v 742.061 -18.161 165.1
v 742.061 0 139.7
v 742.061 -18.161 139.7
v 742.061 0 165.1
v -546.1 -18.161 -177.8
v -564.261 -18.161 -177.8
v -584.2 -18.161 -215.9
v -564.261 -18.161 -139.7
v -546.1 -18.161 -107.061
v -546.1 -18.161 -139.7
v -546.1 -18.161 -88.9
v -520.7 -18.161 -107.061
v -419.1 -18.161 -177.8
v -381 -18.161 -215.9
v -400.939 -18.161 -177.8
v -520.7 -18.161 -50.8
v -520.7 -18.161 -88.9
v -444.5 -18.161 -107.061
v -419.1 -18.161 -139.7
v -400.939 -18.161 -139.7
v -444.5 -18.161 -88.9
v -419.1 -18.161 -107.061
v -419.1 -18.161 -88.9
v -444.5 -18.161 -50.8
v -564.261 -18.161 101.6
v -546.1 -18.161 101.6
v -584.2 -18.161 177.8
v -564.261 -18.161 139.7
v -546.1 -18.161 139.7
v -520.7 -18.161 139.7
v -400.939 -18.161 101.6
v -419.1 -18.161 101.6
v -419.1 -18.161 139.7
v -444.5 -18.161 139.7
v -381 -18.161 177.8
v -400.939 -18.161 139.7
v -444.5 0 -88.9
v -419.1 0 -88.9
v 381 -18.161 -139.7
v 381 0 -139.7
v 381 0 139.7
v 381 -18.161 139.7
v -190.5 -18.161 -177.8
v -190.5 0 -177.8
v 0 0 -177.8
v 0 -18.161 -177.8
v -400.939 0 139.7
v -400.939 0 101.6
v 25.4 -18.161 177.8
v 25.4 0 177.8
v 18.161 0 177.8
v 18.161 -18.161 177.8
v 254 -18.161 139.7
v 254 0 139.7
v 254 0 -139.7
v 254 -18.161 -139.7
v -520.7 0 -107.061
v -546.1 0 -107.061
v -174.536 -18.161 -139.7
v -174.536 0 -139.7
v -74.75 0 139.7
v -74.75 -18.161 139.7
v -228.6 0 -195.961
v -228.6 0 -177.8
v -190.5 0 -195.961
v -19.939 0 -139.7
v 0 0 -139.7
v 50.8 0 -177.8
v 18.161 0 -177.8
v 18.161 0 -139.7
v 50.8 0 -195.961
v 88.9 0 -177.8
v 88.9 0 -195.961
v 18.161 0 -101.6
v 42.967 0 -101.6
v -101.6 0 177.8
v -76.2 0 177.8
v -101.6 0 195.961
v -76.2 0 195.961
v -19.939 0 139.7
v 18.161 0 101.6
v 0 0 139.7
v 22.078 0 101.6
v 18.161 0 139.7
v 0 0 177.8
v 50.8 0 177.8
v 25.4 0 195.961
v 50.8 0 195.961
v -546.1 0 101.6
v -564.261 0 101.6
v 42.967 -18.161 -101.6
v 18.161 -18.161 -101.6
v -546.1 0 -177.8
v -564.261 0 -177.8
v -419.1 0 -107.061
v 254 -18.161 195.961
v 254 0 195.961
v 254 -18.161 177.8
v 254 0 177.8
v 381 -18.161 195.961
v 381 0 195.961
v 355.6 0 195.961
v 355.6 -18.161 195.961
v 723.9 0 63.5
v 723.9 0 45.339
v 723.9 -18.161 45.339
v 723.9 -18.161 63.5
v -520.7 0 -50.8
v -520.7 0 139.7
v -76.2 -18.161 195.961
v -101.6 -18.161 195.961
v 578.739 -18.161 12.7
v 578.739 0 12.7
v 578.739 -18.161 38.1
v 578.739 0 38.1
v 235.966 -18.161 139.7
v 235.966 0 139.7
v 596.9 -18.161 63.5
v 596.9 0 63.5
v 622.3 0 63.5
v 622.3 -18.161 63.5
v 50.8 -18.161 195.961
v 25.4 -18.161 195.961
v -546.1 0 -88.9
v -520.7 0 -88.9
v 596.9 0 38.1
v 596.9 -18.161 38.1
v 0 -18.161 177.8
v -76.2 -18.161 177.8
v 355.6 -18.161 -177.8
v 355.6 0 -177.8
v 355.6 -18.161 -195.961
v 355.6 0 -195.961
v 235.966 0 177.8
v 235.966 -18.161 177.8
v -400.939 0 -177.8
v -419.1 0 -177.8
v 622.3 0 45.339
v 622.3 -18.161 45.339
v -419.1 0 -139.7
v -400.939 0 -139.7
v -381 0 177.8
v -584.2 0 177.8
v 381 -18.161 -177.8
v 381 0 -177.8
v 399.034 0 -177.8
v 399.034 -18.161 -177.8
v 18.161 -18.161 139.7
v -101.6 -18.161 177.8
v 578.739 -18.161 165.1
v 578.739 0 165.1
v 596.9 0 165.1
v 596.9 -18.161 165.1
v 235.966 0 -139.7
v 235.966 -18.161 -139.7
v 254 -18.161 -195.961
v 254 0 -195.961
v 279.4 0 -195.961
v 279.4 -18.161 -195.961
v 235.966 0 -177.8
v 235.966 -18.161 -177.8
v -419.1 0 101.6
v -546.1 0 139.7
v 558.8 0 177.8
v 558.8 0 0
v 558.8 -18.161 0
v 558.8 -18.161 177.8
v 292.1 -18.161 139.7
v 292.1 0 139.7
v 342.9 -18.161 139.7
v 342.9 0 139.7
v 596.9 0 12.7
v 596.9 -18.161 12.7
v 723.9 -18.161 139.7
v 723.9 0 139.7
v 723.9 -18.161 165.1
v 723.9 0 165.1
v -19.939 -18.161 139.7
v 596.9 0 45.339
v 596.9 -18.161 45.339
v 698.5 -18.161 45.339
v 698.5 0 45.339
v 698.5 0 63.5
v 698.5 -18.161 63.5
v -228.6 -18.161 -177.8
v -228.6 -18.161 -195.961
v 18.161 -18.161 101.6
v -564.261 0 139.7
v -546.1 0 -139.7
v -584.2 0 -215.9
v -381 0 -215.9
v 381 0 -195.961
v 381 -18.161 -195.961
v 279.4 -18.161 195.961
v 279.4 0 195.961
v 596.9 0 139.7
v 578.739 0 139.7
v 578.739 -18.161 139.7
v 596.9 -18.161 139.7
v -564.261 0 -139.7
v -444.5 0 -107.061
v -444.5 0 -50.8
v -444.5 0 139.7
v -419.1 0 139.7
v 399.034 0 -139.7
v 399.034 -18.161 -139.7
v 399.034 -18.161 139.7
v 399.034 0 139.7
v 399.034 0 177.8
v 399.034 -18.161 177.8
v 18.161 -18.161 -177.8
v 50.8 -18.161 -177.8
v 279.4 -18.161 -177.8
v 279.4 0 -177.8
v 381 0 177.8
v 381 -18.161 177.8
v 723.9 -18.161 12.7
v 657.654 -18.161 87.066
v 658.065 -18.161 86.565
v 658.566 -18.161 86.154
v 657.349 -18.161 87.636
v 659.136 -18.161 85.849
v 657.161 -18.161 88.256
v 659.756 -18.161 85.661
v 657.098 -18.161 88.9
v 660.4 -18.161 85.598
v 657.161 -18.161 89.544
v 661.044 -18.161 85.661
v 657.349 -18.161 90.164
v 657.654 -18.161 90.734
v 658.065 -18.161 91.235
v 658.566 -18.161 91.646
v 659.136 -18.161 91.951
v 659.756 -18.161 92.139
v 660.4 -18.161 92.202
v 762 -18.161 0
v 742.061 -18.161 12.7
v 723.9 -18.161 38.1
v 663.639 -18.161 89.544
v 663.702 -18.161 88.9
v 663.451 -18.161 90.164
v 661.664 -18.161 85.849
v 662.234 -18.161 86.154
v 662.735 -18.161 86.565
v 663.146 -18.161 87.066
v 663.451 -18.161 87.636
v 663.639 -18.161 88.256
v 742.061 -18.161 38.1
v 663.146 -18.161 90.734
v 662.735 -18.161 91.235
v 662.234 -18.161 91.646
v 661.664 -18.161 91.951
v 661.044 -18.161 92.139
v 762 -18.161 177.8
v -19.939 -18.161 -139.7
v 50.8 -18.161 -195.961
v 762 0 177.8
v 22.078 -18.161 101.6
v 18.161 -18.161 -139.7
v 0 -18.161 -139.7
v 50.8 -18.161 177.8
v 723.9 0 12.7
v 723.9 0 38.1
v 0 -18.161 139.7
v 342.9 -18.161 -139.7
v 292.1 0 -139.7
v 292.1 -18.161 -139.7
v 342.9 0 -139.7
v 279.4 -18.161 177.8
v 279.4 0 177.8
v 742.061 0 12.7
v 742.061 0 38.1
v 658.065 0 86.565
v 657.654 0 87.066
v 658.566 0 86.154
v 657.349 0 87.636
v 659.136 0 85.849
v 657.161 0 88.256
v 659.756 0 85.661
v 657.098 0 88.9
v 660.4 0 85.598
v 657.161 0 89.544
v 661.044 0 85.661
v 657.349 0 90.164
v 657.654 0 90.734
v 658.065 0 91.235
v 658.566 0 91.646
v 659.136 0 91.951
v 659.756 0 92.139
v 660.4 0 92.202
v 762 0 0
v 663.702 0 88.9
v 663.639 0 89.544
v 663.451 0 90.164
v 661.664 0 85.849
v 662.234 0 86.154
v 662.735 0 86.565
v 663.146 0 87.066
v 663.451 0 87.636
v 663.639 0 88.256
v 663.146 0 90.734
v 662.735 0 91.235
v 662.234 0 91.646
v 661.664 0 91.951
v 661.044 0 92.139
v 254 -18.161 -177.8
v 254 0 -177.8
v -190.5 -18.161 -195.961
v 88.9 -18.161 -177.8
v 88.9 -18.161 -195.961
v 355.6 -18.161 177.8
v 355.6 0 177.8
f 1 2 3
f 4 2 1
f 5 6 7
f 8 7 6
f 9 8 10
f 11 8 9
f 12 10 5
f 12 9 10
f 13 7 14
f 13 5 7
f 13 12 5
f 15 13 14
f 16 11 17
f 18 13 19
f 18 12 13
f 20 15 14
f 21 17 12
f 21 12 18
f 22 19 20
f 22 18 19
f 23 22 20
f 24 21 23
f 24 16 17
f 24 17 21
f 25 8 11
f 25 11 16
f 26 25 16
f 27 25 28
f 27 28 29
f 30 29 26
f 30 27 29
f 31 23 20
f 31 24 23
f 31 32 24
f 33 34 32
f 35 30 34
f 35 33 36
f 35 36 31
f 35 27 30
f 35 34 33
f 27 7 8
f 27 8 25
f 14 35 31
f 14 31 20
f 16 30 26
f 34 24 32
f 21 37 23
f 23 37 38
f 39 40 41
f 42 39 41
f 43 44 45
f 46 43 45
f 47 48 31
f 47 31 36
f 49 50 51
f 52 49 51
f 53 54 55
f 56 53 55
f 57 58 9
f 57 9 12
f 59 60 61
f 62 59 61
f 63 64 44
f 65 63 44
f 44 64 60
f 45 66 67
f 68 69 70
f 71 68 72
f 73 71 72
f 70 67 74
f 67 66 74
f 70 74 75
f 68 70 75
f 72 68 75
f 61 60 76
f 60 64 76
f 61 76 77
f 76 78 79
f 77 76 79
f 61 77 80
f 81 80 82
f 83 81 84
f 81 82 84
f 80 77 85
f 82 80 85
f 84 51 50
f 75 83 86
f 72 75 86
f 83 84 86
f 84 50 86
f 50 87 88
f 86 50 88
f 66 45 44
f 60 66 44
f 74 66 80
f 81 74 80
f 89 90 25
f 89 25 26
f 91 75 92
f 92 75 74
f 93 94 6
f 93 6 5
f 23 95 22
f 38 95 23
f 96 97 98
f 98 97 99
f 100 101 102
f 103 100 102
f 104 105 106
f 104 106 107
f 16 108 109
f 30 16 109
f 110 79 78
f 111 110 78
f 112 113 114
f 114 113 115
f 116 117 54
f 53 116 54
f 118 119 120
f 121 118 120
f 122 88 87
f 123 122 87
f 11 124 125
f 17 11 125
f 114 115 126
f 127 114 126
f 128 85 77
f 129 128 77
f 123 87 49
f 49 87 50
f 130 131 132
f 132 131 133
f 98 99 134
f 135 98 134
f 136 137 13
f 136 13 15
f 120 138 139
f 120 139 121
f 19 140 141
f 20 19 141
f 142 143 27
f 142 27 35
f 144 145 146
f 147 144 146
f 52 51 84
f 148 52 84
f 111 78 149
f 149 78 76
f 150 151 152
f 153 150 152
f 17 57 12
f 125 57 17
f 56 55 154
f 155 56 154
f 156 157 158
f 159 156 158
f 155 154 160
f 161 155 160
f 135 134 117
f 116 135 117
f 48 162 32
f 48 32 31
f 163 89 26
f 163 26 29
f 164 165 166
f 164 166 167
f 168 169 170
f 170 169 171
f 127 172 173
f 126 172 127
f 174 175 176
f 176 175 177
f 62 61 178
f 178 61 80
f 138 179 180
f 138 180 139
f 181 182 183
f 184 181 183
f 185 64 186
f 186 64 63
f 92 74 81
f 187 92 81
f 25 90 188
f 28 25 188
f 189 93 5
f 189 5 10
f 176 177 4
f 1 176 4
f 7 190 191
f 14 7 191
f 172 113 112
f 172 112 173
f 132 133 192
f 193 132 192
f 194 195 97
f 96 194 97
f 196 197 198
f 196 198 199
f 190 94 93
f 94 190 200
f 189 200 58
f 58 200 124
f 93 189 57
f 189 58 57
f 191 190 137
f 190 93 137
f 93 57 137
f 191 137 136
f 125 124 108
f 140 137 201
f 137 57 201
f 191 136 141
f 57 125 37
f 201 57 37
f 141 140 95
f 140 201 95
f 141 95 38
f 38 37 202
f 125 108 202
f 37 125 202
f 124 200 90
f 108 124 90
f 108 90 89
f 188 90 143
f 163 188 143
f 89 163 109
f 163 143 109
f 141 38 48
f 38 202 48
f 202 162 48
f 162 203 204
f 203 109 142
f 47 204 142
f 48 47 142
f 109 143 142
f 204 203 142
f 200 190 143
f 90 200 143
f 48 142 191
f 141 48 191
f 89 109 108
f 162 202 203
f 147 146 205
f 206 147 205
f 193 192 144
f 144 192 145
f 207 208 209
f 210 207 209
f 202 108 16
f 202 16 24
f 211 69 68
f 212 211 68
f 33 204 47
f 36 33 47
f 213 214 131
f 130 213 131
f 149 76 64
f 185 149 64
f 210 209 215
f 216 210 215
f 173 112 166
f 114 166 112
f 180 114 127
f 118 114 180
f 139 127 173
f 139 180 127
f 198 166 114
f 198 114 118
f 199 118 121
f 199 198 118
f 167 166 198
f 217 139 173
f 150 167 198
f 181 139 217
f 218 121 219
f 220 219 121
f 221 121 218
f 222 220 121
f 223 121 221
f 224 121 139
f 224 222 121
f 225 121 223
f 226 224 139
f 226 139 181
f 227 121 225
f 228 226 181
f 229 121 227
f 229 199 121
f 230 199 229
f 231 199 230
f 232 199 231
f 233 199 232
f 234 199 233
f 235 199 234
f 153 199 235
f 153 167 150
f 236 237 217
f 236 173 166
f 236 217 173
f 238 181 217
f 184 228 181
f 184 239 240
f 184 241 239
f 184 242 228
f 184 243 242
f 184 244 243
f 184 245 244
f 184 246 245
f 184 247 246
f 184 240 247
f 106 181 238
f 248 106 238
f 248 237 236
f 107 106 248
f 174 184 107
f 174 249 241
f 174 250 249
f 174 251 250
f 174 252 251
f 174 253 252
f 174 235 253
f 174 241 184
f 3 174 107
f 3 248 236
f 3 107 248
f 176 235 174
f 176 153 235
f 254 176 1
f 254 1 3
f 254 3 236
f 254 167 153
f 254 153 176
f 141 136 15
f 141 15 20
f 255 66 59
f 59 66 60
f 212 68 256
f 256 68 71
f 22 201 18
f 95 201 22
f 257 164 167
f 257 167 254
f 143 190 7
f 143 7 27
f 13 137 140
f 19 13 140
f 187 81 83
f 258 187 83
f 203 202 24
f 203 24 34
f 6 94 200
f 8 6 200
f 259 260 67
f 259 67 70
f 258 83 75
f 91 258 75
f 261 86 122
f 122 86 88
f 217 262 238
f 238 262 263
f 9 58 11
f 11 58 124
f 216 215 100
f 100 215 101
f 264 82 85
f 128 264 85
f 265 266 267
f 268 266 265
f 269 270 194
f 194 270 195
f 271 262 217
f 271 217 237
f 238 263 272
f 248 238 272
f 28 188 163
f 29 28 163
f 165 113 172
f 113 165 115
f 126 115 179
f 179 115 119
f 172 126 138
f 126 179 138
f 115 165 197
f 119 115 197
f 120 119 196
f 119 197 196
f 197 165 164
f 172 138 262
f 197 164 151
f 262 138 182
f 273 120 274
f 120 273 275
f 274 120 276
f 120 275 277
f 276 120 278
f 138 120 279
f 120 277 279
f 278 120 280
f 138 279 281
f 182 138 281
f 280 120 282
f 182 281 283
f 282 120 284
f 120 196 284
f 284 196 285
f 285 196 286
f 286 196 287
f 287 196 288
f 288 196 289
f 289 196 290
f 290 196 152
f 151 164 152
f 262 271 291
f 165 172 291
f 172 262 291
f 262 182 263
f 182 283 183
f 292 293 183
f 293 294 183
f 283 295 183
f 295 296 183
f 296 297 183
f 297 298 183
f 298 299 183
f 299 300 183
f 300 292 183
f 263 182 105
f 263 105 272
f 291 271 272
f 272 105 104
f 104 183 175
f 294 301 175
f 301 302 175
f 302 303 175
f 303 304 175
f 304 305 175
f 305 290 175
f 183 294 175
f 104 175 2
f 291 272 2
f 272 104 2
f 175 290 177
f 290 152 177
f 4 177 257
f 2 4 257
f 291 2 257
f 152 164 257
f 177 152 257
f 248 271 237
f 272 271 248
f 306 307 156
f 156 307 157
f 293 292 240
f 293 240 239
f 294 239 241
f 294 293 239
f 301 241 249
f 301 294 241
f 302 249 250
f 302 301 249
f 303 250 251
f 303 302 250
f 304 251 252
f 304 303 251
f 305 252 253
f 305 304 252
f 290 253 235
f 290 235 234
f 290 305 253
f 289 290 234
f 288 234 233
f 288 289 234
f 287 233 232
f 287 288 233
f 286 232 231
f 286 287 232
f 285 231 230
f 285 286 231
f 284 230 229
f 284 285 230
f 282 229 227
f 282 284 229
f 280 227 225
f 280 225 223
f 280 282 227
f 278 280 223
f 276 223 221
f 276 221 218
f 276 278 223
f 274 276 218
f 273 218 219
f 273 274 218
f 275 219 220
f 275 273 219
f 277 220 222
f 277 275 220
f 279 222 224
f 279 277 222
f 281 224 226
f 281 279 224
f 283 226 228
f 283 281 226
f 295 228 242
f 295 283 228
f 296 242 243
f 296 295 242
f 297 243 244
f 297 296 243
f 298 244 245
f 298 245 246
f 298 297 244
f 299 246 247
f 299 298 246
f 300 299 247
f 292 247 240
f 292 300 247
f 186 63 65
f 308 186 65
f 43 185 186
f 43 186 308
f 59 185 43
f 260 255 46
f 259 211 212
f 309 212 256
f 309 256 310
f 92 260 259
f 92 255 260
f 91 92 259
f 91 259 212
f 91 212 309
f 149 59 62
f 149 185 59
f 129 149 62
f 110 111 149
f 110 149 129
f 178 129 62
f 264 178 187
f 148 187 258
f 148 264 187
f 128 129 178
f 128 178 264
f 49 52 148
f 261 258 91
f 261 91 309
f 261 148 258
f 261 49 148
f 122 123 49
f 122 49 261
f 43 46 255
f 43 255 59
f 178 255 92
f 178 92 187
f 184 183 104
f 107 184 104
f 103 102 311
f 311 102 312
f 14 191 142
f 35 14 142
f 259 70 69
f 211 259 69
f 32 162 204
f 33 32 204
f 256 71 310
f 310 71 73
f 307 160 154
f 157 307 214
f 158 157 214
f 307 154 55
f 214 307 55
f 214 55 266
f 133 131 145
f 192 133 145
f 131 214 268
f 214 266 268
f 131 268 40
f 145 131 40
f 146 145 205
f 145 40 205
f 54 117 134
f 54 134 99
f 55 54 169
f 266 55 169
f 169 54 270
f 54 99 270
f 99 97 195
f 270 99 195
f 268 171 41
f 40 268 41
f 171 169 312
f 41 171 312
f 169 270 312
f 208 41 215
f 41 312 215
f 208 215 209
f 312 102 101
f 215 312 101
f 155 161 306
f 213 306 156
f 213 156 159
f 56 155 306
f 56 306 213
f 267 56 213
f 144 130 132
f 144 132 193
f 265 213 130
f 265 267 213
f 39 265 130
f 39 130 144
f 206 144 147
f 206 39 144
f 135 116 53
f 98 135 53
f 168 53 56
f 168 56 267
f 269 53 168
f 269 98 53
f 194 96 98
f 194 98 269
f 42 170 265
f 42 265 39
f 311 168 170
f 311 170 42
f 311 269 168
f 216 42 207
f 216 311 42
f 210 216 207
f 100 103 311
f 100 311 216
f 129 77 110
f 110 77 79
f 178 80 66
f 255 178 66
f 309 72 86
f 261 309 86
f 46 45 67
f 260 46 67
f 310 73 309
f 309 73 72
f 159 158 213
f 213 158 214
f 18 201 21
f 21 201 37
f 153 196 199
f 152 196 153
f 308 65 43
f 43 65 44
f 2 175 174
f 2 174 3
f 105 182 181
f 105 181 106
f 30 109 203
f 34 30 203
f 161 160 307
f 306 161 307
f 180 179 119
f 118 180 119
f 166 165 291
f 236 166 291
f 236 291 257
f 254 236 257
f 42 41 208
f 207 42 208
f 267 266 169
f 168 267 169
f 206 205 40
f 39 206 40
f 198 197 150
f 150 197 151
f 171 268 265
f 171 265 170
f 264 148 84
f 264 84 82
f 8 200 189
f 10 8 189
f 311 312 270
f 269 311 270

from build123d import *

# Parameters (mm, degrees)
F0_W     = 50.8
F0_H     = 279.4
F0_W_2   = 203.2
F0_H_2   = 177.8
F0_W_3   = 18.161
F0_H_3   = 25.4
F0_W_4   = 25.4
F0_H_4   = 18.161
F0_R     = 3.302
F0_H_5   = 393.7
F0_H_6   = 38.1
F0_W_5   = 76.2
F0_H_7   = 190.5
F1_DEPTH = 18.161


with BuildPart() as f1:
    # F0 (on Front) → F1 (new body)
    with BuildSketch(Plane.XZ):
        Polygon((0, 139.7), (0, 177.8), (-76.2, 177.8), (-76.2, 195.961), (-101.6, 195.961), (-101.6, 177.8), (-228.6, -177.8), (-228.6, -195.961), (-190.5, -195.961), (-190.5, -177.8), (0, -177.8), (0, -139.7), (18.161, -139.7), (18.161, -177.8), (50.8, -177.8), (50.8, -195.961), (88.9, -195.961), (88.9, -177.8), (50.8, 177.8), (50.8, 195.961), (25.4, 195.961), (25.4, 177.8), (18.161, 177.8), (18.161, 139.7), align=None)
        Polygon((-74.750199, 139.7), (-19.939, 139.7), (-19.939, -139.7), (-174.535913, -139.7), align=None, mode=Mode.SUBTRACT)
        Polygon((18.161, 101.6), (22.07768, 101.6), (42.96664, -101.6), (18.161, -101.6), align=None, mode=Mode.SUBTRACT)
        Polygon((355.6, 177.8), (279.4, 177.8), (279.4, 195.961), (254, 195.961), (254, 177.8), (235.966, 177.8), (235.966, 139.7), (254, 139.7), (254, -139.7), (235.966, -139.7), (235.966, -177.8), (254, -177.8), (254, -195.961), (279.4, -195.961), (279.4, -177.8), (355.6, -177.8), (355.6, -195.961), (381, -195.961), (381, -177.8), (399.034, -177.8), (399.034, -139.7), (381, -139.7), (381, 139.7), (399.034, 139.7), (399.034, 177.8), (381, 177.8), (381, 195.961), (355.6, 195.961), align=None)
        with Locations((317.5, 0)):
            Rectangle(F0_W, F0_H, mode=Mode.SUBTRACT)
        with Locations((660.4, 88.9)):
            Rectangle(F0_W_2, F0_H_2)
        with Locations((587.8195, 25.4)):
            Rectangle(F0_W_3, F0_H_3, mode=Mode.SUBTRACT)
        with Locations((732.9805, 25.4)):
            Rectangle(F0_W_3, F0_H_3, mode=Mode.SUBTRACT)
        with Locations((609.6, 54.4195)):
            Rectangle(F0_W_4, F0_H_4, mode=Mode.SUBTRACT)
        with Locations((711.2, 54.4195)):
            Rectangle(F0_W_4, F0_H_4, mode=Mode.SUBTRACT)
        with Locations((660.4, 88.9)):
            Circle(F0_R, mode=Mode.SUBTRACT)
        with Locations((587.8195, 152.4)):
            Rectangle(F0_W_3, F0_H_3, mode=Mode.SUBTRACT)
        with Locations((732.9805, 152.4)):
            Rectangle(F0_W_3, F0_H_3, mode=Mode.SUBTRACT)
        with Locations((-482.6, -19.05)):
            Rectangle(F0_W_2, F0_H_5)
        with Locations((-555.1805, -158.75)):
            Rectangle(F0_W_3, F0_H_6, mode=Mode.SUBTRACT)
        with Locations((-410.0195, -158.75)):
            Rectangle(F0_W_3, F0_H_6, mode=Mode.SUBTRACT)
        with Locations((-533.4, -97.9805)):
            Rectangle(F0_W_4, F0_H_4, mode=Mode.SUBTRACT)
        with Locations((-431.8, -97.9805)):
            Rectangle(F0_W_4, F0_H_4, mode=Mode.SUBTRACT)
        with Locations((-482.6, 44.45)):
            Rectangle(F0_W_5, F0_H_7, mode=Mode.SUBTRACT)
        with Locations((-555.1805, 120.65)):
            Rectangle(F0_W_3, F0_H_6, mode=Mode.SUBTRACT)
        with Locations((-410.0195, 120.65)):
            Rectangle(F0_W_3, F0_H_6, mode=Mode.SUBTRACT)
    extrude(amount=F1_DEPTH)


solid = f1.part
